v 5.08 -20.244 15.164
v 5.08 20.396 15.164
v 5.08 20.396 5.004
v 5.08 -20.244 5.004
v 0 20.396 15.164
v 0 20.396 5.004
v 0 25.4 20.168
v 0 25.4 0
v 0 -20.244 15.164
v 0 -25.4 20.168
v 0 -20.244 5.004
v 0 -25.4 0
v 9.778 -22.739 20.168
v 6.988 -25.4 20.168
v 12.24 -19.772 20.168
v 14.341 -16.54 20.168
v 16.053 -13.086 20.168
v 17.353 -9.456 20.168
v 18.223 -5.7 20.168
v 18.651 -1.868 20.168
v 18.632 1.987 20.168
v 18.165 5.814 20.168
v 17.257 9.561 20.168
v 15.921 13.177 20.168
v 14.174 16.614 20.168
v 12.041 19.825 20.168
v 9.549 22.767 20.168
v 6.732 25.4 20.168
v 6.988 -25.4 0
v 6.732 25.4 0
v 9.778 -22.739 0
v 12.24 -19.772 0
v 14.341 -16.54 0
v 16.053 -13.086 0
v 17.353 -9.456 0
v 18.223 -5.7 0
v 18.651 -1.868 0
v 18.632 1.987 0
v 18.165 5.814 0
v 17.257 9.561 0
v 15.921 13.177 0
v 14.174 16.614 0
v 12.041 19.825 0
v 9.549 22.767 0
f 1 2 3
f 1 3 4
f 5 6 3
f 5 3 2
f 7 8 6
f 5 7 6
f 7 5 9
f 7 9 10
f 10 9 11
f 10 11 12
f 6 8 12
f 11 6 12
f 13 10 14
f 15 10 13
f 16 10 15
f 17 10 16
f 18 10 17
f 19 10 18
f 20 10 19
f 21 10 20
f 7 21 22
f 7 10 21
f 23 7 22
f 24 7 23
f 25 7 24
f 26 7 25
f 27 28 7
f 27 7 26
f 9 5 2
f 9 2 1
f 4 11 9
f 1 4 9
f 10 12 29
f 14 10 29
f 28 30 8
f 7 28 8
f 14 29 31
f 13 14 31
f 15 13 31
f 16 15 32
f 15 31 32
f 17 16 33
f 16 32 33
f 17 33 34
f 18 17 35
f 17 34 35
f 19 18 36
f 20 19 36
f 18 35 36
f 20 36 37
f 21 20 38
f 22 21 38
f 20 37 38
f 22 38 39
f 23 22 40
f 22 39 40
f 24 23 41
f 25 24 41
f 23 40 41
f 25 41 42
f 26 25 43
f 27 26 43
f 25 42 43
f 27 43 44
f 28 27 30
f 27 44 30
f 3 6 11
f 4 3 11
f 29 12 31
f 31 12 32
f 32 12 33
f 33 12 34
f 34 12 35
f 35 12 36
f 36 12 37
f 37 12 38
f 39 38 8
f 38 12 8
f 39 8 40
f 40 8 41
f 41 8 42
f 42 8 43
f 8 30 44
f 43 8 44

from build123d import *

# Parameters (mm, degrees)
F2_DEPTH = 20.1676
F3_W     = 40.64
F3_H     = 10.16
F4_DEPTH = 5.08


with BuildPart() as f2:
    # F1 (on Top) → F2 (new body)
    with BuildSketch(Plane.XY):
        with BuildLine():
            Line((6.7323240508, 25.4), (0, 25.4))
            Line((0, 25.4), (0, -25.4))
            Line((0, -25.4), (6.988068358, -25.4))
            ThreePointArc((6.988068358, -25.4), (18.6973375399, 0.0595921557), (6.7323240508, 25.4))
        make_face()
    extrude(amount=F2_DEPTH)

    # F3 (on face) → F4 (cut)
    with BuildSketch(Plane(origin=(0, 0, 0), x_dir=(0, -1, 0), z_dir=(-1, 0, 0))):
        with Locations((-0.0762, 10.0838)):
            Rectangle(F3_W, F3_H)
    extrude(amount=-F4_DEPTH, mode=Mode.SUBTRACT)


solid = f2.part
